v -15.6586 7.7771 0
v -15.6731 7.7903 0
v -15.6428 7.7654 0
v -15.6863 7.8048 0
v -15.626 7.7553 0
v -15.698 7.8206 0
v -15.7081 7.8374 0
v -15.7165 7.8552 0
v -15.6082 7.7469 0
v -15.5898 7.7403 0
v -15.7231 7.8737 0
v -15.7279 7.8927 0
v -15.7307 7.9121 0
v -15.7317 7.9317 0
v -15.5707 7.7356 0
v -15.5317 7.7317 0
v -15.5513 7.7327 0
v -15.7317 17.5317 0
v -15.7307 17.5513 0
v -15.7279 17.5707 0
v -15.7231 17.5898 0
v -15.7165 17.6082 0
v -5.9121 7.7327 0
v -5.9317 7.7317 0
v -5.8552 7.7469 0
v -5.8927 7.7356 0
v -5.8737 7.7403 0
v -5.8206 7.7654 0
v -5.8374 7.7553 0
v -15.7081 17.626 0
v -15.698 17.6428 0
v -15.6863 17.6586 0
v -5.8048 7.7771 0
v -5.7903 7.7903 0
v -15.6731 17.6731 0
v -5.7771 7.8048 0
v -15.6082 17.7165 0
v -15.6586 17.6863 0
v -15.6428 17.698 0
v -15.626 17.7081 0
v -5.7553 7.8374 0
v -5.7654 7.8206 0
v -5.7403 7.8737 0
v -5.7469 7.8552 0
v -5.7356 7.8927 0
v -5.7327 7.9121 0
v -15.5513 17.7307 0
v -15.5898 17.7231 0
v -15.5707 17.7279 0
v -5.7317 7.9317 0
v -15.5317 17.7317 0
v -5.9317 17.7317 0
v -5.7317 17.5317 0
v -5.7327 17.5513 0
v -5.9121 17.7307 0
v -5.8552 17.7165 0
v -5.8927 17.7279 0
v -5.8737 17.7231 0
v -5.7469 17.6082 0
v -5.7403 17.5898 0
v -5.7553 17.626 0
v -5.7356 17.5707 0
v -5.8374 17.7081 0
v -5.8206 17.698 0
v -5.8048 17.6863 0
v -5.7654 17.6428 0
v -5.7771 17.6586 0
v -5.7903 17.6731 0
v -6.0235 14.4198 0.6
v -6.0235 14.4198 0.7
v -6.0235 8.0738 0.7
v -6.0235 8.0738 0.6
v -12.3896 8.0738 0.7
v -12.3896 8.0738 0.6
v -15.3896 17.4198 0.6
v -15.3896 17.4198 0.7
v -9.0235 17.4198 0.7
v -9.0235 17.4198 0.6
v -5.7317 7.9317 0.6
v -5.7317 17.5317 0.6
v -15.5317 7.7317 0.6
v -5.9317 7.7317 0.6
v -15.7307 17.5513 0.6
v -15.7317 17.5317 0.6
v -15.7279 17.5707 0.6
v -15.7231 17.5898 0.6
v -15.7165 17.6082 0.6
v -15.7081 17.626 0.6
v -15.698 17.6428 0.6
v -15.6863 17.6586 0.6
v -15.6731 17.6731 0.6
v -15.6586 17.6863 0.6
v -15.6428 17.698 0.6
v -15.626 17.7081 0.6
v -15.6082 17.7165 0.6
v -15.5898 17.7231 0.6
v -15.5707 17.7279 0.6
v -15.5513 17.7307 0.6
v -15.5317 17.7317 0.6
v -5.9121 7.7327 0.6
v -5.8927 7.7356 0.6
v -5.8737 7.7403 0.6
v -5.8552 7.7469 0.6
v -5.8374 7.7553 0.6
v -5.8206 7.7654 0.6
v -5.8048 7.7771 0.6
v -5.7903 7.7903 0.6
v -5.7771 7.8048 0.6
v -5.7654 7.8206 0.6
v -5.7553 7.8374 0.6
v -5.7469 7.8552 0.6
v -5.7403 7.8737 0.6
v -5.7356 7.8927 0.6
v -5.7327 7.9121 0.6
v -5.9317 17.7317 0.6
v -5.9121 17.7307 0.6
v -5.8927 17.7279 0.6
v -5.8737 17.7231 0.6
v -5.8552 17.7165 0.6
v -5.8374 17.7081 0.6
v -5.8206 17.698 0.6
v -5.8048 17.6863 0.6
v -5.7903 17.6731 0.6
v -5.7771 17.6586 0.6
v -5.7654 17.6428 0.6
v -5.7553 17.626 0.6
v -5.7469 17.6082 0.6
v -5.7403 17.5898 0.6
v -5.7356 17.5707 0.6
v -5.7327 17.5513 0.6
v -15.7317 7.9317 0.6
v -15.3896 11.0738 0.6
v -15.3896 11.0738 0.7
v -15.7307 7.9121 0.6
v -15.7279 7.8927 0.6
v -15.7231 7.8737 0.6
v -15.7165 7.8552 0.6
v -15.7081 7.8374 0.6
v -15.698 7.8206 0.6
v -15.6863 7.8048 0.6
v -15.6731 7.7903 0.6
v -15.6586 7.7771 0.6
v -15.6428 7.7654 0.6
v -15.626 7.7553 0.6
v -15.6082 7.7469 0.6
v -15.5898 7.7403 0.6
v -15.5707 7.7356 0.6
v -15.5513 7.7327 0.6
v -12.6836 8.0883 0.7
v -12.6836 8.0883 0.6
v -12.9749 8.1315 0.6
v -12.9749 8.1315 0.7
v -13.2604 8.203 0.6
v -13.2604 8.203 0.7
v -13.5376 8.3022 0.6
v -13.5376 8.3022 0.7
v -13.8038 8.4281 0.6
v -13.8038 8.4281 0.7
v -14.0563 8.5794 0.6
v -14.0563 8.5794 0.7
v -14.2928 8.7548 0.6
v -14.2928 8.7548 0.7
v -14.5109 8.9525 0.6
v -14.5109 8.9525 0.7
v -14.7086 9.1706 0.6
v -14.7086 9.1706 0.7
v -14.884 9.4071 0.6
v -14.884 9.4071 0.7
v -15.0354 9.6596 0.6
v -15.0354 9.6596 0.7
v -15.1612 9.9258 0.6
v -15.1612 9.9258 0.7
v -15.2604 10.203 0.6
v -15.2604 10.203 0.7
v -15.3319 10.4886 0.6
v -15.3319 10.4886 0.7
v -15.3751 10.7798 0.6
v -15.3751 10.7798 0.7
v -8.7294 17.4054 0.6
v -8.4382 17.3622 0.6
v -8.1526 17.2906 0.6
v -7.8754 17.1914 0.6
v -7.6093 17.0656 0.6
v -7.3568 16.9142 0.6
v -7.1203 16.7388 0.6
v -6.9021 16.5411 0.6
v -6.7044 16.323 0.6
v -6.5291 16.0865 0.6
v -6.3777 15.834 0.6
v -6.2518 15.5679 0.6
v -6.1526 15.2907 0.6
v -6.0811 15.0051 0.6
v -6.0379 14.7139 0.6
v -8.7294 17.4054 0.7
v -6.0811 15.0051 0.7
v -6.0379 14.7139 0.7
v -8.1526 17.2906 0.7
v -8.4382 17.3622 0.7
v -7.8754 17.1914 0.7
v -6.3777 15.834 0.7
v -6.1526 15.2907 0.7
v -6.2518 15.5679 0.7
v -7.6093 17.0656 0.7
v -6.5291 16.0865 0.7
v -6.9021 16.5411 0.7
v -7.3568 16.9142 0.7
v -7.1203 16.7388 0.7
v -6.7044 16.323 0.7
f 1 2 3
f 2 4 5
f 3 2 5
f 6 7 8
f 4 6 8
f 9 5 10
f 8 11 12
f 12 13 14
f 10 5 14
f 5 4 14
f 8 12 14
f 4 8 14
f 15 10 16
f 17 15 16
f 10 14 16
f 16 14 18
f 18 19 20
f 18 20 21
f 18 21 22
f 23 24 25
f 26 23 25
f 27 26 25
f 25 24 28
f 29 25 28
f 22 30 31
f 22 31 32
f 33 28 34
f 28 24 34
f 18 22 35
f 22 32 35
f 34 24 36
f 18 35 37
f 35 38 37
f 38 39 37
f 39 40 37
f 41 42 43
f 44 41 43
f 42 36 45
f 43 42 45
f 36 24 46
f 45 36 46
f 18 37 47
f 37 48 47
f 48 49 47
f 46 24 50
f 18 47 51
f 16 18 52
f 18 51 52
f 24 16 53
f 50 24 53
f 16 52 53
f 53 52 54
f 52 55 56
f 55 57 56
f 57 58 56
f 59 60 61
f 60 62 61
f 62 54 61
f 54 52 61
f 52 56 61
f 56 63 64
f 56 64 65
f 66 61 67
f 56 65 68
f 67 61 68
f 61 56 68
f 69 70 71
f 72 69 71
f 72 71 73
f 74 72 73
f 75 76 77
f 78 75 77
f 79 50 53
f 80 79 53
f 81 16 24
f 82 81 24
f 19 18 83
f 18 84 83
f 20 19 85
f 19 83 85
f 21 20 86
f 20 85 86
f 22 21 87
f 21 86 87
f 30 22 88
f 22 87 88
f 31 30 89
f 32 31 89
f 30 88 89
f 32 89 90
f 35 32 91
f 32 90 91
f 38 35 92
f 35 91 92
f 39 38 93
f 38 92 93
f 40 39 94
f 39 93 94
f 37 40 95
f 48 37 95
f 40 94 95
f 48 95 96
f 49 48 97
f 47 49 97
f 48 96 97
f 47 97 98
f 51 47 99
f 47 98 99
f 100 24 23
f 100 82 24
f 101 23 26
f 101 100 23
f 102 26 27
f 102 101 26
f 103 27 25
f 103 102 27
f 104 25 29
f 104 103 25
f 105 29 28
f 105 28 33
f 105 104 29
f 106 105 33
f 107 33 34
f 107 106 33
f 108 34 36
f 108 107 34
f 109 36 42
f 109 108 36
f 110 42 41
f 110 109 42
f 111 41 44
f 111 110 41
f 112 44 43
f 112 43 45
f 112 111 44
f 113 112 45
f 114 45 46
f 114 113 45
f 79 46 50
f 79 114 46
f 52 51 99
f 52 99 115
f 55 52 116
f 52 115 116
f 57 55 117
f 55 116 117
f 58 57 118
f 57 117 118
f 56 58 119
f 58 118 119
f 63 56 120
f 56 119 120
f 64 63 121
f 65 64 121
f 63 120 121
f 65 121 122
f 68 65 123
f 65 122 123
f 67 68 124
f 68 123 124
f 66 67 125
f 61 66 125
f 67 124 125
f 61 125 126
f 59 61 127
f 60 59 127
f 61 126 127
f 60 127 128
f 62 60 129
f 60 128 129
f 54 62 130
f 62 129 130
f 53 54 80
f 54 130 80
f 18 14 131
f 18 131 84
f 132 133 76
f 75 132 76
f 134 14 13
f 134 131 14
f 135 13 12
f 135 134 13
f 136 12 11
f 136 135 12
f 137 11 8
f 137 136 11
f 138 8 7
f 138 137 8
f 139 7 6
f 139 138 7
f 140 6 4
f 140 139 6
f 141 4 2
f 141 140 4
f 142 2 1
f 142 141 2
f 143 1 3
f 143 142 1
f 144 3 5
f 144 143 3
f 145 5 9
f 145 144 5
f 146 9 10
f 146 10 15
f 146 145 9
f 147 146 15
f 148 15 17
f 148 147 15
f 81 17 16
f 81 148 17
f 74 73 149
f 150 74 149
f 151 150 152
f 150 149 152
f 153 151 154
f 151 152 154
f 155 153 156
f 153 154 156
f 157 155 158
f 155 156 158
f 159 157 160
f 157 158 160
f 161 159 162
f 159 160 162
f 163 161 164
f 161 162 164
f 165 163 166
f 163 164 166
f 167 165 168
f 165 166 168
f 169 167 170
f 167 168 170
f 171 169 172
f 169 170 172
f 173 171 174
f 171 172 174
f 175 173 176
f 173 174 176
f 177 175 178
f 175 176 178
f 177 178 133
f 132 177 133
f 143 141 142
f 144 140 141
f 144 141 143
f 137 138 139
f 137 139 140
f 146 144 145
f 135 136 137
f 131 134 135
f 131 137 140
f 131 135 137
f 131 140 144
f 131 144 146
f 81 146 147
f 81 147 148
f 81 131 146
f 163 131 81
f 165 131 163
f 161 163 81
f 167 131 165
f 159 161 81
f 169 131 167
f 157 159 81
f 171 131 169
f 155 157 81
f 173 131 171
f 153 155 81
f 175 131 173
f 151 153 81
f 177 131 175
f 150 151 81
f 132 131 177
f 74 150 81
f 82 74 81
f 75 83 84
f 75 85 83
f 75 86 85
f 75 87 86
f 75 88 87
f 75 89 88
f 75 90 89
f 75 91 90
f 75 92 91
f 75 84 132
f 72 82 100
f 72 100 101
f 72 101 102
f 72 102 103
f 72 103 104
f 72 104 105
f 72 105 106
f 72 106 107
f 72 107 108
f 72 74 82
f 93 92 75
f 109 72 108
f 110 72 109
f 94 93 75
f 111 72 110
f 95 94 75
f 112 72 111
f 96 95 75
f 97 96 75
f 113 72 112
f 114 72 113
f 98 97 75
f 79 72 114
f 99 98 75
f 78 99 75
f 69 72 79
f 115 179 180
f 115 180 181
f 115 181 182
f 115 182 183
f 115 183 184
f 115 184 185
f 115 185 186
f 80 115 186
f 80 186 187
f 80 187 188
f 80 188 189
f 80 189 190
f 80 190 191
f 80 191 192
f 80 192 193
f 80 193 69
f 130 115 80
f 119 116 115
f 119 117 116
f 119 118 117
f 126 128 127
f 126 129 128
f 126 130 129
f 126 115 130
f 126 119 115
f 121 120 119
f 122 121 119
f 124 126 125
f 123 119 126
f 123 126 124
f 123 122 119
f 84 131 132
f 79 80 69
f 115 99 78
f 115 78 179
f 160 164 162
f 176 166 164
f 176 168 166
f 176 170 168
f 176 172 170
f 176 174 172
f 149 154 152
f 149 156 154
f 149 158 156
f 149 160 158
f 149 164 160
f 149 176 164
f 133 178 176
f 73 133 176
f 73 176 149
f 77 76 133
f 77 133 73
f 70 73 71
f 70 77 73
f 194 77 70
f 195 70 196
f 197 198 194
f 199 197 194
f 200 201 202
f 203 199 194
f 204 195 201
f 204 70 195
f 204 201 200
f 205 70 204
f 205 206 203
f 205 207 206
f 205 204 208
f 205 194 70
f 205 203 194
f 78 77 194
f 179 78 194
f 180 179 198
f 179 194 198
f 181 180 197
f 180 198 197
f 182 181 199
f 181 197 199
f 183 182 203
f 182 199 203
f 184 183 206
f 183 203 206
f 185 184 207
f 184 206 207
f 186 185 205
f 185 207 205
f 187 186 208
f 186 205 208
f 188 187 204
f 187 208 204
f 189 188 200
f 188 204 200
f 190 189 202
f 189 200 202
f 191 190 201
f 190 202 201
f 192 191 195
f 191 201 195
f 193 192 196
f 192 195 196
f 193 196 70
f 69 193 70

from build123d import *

# Parameters (mm, degrees)
SKETCH_1_W          = 10
SKETCH_1_H          = 10
EXTRUDE_1_DEPTH     = 0.7
SKETCH_2_W          = 10
SKETCH_2_H          = 10
CUT_EXTRUDE_1_DEPTH = 0.1
FILLET_1_R          = 0.2


with BuildPart() as part:
    # 草图1 → 凸台-拉伸1 (new body)
    with BuildSketch(Plane.XY):
        with Locations((-10.731707317, 12.731707317)):
            Rectangle(SKETCH_1_W, SKETCH_1_H)
    extrude(amount=EXTRUDE_1_DEPTH)

    # 草图2 → 切除-拉伸1 (cut)
    with BuildSketch(Plane.XY.offset(0.7)):
        with Locations((-10.731707317, 12.731707317)):
            Rectangle(SKETCH_2_W, SKETCH_2_H)
        with BuildLine():
            Line((-15.389589016, 17.419802303), (-9.02347014, 17.419802303))
            ThreePointArc((-9.02347014, 17.419802303), (-6.902149796, 16.541122647), (-6.02347014, 14.419802303))
            Line((-6.02347014, 14.419802303), (-6.02347014, 8.073825618))
            Line((-6.02347014, 8.073825618), (-12.389589016, 8.073825618))
            ThreePointArc((-12.389589016, 8.073825618), (-14.51090936, 8.952505274), (-15.389589016, 11.073825618))
            Line((-15.389589016, 11.073825618), (-15.389589016, 17.419802303))
        make_face(mode=Mode.SUBTRACT)
    extrude(amount=-CUT_EXTRUDE_1_DEPTH, mode=Mode.SUBTRACT)

    # 圆角1
    fillet_1_edges = [part.edges().sort_by_distance(p)[0] for p in [
        (-15.731707317, 17.731707317, 0.3),
        (-5.731707317, 17.731707317, 0.3),
        (-5.731707317, 7.731707317, 0.3),
        (-15.731707317, 7.731707317, 0.3),
    ]]
    fillet(fillet_1_edges, radius=FILLET_1_R)


solid = part.part
